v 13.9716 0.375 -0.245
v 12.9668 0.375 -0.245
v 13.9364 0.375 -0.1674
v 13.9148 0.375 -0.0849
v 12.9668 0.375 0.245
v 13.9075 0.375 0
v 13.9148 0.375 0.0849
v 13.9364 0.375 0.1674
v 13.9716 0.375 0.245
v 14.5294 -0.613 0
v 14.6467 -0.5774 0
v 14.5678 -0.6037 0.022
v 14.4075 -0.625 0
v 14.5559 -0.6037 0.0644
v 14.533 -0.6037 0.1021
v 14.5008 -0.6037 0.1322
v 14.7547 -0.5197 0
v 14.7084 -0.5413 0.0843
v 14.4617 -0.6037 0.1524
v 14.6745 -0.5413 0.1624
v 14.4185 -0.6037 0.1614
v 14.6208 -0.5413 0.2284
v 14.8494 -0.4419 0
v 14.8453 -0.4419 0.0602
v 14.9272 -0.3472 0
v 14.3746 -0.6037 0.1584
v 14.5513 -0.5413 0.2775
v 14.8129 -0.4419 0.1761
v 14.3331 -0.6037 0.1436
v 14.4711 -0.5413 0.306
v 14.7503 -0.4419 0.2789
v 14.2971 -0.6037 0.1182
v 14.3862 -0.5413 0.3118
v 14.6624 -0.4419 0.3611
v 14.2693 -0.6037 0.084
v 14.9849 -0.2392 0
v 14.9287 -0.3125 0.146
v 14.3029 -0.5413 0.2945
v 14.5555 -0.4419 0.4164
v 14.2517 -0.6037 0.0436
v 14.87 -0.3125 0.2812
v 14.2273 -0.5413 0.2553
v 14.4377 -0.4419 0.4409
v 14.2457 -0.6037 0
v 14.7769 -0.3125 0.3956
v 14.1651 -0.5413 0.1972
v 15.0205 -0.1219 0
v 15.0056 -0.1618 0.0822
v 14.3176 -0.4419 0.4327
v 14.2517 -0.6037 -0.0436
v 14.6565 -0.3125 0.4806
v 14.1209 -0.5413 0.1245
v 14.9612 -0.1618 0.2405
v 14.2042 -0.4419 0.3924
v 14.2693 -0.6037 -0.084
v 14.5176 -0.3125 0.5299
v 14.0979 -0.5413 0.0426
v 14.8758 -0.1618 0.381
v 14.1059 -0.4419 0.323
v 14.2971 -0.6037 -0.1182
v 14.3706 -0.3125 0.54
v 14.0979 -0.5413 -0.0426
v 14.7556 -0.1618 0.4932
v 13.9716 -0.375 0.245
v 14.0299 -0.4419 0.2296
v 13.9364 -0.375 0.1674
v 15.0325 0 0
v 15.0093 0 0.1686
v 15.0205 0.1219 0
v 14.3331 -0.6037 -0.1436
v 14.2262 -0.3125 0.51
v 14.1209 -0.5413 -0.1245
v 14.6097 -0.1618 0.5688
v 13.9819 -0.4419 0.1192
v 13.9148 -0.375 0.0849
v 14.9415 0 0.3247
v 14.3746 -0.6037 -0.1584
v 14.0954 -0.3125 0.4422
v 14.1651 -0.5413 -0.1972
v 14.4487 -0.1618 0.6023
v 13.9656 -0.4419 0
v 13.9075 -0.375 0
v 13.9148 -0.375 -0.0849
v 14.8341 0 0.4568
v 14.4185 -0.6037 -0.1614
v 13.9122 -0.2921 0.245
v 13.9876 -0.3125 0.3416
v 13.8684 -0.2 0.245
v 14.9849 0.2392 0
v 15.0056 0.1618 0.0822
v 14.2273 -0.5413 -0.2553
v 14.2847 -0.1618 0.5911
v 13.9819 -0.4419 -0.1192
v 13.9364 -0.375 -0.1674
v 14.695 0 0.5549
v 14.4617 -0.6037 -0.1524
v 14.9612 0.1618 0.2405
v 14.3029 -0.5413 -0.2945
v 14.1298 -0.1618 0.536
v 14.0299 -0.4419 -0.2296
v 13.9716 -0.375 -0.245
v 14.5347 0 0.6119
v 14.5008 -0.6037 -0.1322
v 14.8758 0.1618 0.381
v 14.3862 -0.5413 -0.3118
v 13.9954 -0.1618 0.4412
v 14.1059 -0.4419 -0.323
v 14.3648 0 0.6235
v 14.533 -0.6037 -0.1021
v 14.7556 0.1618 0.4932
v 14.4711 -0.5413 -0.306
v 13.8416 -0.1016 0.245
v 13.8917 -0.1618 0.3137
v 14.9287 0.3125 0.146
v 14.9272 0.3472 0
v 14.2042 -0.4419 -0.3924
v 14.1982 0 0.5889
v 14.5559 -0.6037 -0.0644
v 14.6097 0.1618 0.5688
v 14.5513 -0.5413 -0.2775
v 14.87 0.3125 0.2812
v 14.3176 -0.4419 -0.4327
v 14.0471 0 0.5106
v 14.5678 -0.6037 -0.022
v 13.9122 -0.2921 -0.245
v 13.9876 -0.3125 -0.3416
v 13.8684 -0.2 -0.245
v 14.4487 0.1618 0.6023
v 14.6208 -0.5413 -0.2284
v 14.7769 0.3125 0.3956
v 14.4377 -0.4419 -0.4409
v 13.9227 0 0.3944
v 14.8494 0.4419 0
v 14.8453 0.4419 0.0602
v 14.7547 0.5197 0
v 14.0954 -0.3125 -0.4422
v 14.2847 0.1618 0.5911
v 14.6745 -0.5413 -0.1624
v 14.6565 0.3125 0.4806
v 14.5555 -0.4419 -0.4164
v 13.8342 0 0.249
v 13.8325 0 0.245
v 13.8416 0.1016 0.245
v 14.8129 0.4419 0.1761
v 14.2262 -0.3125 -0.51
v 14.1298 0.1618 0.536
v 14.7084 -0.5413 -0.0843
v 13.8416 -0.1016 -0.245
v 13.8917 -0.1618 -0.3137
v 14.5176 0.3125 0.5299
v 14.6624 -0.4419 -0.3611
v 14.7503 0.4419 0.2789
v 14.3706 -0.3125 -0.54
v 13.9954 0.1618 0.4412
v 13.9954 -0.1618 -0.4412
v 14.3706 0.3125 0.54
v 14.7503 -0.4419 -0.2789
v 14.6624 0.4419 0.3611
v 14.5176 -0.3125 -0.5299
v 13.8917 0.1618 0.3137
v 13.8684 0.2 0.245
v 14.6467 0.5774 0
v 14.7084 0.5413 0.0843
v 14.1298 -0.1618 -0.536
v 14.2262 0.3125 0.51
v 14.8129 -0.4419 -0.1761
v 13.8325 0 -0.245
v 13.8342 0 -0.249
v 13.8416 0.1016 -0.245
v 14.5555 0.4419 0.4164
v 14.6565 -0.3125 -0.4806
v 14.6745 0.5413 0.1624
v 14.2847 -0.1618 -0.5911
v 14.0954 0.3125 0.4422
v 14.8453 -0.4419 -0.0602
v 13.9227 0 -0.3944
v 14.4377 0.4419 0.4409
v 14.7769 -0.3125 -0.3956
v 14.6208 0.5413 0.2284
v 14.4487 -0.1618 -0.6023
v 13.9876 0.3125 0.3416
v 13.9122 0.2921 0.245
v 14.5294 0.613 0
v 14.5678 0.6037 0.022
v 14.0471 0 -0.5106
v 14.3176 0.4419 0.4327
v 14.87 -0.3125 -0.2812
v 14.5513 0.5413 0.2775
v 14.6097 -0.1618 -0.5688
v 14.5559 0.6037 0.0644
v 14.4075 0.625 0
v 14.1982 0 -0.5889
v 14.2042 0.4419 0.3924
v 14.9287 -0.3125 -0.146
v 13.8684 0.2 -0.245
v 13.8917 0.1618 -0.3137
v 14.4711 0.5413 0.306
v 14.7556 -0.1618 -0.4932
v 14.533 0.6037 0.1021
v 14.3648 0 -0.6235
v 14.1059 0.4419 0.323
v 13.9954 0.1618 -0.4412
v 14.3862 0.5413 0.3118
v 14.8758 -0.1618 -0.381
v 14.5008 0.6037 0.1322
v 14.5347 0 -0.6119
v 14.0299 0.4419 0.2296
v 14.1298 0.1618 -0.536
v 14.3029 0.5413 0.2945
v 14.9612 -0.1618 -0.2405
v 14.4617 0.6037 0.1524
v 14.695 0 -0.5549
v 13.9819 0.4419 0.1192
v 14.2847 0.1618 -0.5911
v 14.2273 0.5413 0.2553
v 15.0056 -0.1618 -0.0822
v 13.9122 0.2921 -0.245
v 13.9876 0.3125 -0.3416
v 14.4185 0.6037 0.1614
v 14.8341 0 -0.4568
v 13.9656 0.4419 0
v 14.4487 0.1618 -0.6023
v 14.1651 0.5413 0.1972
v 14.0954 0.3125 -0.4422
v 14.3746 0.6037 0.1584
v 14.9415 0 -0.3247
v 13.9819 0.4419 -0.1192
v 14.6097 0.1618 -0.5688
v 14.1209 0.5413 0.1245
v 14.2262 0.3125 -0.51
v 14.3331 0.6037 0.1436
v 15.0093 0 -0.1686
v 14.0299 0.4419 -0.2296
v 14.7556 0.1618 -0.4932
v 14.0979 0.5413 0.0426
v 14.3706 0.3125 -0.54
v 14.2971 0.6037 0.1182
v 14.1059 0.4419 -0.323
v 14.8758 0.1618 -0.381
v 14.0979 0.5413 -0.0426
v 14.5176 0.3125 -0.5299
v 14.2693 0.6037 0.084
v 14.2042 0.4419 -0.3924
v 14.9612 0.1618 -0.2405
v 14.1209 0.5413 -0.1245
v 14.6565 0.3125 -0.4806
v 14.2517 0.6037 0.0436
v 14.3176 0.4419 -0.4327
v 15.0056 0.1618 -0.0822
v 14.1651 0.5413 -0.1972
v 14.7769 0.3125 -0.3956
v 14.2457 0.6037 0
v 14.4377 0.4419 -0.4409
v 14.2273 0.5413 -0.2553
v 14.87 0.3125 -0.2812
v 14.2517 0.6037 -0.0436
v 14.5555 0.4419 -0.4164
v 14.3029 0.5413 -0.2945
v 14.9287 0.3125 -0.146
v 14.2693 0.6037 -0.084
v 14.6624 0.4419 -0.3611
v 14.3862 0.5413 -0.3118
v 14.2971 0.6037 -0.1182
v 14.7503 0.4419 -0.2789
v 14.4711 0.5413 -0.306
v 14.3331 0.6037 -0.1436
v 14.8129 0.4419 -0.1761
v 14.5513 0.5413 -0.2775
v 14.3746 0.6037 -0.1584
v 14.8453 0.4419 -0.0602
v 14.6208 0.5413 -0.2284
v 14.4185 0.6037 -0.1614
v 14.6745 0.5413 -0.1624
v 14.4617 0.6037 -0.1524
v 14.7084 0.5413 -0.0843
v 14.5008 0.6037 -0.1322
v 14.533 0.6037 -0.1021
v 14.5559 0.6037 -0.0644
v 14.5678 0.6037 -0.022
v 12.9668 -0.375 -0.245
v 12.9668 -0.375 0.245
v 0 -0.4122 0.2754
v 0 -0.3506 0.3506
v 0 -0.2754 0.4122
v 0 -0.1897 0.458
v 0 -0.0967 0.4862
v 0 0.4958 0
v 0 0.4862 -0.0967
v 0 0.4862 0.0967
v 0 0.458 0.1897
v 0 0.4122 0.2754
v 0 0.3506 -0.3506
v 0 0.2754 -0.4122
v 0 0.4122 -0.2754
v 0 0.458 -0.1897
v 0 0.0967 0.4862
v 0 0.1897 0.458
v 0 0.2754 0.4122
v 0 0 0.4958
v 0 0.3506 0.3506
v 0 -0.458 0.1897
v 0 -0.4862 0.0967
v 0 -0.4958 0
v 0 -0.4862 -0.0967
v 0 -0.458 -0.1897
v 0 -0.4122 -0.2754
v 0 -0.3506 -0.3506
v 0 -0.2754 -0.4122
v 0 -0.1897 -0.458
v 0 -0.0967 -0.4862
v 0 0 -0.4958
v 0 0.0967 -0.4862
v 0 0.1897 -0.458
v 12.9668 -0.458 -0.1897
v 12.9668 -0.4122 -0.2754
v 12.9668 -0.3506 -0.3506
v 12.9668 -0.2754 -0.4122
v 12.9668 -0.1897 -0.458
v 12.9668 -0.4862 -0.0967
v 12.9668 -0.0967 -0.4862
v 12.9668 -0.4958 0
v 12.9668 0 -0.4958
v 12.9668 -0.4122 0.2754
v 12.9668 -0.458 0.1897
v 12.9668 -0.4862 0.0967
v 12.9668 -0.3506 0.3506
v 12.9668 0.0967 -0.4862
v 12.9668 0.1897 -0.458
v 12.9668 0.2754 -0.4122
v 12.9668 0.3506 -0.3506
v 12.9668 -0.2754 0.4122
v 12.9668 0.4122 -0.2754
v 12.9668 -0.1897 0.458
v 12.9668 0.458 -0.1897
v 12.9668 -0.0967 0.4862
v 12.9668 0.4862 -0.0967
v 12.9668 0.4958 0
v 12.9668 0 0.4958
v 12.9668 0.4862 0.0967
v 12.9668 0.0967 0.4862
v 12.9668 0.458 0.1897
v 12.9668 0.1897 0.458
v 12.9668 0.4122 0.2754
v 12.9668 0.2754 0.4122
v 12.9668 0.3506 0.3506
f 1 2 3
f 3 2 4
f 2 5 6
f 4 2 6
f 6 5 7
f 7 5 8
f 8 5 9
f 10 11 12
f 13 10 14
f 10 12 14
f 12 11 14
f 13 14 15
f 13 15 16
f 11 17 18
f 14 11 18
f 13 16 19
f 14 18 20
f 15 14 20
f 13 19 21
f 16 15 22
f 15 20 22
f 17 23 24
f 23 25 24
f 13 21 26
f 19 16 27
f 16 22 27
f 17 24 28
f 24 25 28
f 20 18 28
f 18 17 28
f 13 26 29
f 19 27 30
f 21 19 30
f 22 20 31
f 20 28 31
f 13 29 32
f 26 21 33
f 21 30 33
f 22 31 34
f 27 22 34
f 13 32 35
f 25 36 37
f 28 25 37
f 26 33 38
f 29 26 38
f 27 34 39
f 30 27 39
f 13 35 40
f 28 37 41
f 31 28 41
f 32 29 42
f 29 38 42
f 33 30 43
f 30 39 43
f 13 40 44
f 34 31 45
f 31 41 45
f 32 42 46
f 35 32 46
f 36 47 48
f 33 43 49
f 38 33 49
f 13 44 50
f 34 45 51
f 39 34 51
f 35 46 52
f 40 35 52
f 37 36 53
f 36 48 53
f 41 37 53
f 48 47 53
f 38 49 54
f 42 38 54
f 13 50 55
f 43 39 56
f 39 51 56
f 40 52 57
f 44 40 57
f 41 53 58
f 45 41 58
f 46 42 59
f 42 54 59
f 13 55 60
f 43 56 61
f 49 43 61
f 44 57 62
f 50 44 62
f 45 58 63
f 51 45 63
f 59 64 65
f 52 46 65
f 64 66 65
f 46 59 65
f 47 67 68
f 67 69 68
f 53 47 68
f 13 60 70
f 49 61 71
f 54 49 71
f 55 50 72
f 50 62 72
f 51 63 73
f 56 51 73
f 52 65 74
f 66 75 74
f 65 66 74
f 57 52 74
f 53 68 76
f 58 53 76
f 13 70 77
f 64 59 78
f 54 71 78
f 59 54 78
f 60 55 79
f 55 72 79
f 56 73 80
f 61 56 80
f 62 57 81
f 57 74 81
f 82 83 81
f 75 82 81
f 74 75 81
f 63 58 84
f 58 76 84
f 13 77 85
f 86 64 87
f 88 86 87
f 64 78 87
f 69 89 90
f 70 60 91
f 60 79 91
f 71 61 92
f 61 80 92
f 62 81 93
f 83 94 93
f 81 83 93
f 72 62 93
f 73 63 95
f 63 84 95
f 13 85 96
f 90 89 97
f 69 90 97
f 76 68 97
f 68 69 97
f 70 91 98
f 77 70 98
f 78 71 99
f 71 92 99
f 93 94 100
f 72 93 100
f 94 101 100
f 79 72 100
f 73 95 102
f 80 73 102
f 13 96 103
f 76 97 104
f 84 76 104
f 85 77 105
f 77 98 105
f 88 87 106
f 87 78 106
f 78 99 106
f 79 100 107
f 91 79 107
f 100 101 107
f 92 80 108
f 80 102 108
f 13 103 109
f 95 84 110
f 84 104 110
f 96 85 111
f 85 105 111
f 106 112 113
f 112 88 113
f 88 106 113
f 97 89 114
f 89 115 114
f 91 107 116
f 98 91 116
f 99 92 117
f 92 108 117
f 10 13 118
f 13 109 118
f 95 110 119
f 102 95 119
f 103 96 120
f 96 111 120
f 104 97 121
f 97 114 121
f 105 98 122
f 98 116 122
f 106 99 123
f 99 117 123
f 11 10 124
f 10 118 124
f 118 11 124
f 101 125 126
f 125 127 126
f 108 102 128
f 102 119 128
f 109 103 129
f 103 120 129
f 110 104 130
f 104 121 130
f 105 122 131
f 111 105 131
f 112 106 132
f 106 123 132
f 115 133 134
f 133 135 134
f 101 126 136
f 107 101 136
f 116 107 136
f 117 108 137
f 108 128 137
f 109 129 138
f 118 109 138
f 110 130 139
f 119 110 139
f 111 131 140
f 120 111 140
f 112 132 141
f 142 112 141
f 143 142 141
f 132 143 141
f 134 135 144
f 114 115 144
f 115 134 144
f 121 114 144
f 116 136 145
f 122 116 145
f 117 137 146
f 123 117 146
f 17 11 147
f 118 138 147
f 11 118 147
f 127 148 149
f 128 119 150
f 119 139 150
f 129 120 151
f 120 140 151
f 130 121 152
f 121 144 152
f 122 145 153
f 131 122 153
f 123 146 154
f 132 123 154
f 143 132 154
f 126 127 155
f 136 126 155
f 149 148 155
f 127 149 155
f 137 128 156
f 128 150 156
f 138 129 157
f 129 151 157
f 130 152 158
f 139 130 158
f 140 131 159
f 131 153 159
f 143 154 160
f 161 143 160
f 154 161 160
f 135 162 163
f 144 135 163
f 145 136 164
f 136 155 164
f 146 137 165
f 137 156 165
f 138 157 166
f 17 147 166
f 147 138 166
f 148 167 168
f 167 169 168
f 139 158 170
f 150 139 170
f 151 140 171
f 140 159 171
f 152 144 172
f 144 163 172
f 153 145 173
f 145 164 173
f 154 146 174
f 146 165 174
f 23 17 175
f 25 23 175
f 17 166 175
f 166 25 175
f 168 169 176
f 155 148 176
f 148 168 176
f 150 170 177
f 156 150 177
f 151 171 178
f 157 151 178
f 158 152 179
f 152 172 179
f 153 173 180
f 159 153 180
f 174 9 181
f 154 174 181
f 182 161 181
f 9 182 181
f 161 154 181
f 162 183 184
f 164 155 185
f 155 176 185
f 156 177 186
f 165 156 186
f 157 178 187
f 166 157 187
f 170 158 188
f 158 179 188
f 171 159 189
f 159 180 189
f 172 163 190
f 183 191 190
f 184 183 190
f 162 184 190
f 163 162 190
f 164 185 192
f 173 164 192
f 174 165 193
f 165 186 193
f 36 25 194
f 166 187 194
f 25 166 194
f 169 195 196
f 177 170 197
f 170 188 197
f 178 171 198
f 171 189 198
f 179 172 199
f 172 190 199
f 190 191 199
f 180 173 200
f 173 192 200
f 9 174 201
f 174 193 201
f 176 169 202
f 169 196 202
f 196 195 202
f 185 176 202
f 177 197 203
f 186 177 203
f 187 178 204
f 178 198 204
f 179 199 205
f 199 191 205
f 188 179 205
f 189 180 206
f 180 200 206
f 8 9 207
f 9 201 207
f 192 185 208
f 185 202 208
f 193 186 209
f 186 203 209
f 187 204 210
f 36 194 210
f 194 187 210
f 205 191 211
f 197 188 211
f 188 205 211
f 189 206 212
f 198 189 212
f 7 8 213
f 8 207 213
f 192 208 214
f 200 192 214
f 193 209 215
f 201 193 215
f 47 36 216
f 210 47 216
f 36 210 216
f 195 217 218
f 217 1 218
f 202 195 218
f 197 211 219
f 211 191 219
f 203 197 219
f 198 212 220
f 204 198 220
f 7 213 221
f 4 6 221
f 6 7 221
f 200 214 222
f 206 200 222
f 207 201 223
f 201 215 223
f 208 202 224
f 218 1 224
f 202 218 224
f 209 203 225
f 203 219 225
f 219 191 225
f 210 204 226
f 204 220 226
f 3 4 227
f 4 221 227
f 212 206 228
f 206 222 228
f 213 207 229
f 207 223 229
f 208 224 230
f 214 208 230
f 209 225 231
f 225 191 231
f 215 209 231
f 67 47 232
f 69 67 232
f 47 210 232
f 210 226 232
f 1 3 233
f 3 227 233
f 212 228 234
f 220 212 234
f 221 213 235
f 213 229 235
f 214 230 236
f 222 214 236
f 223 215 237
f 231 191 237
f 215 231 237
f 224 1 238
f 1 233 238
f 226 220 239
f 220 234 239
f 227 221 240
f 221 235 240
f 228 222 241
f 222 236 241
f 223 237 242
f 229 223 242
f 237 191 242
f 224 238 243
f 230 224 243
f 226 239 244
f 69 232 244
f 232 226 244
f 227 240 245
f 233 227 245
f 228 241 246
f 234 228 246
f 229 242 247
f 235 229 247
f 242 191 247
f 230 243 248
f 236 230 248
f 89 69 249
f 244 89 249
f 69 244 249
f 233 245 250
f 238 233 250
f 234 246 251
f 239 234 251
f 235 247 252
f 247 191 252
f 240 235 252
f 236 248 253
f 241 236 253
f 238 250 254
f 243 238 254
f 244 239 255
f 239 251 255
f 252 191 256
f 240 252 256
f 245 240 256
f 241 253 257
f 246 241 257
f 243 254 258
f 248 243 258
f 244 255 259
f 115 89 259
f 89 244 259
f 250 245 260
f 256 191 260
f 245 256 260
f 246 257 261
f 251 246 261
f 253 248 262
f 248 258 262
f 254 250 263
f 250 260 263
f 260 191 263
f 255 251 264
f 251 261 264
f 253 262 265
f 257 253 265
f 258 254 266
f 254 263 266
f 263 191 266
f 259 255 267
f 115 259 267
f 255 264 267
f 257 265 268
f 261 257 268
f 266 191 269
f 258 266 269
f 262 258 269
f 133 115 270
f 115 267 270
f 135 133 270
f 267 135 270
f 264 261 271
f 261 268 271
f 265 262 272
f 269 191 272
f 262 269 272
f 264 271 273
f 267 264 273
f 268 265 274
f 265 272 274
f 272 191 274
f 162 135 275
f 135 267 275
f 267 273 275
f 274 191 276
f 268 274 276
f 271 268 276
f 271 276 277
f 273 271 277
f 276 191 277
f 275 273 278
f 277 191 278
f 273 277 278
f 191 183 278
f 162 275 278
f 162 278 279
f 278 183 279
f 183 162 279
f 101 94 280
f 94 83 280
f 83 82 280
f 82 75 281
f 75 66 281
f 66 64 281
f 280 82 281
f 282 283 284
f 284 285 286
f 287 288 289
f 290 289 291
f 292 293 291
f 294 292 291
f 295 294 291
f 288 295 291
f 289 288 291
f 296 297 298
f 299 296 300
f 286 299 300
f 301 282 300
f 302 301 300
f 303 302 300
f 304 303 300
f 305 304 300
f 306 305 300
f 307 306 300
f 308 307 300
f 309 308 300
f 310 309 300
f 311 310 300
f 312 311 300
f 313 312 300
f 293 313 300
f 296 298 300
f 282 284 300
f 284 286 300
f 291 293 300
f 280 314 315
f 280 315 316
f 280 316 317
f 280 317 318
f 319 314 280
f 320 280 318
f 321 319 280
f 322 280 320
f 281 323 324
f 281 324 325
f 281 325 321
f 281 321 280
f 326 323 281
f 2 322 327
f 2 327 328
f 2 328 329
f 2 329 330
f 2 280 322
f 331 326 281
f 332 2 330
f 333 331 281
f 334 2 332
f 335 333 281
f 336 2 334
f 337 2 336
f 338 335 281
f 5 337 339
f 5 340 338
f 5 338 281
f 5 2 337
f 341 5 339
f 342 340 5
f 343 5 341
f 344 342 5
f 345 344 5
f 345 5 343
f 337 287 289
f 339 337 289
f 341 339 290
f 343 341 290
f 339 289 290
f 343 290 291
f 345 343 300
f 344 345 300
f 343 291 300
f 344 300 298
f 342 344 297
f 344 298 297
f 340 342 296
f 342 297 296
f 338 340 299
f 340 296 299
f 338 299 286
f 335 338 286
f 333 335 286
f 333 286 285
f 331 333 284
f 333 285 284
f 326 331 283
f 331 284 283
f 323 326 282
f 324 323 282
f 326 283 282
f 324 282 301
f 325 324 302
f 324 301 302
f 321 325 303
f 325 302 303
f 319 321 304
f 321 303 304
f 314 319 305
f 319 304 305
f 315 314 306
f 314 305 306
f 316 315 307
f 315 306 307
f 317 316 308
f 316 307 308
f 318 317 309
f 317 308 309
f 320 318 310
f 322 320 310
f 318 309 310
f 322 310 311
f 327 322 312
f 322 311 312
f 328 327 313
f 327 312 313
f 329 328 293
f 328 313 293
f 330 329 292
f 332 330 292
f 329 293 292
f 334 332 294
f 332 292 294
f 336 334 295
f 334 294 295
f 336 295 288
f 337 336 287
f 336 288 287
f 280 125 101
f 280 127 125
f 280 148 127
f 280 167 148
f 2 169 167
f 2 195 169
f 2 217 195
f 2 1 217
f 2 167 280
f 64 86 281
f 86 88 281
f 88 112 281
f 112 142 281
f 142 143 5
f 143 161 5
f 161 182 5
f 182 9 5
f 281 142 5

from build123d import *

# Parameters (mm, degrees)
PAD_DEPTH    = 0.245
SKETCH003_R  = 0.495763
PAD001_DEPTH = 12.96675


with BuildPart() as part:
    # Sketch → Pad (new body, symmetric)
    with BuildSketch(Plane.XY):
        with BuildLine():
            Line((0, 0.375), (14.4075, 0.375))
            ThreePointArc((14.4075, -0.375), (14.7825, 0), (14.4075, 0.375))
            Line((14.4075, -0.375), (0, -0.375))
            Line((0, 0), (0, -0.375))
            Line((0, 0.375), (0, 0))
        make_face()
    extrude(amount=PAD_DEPTH, both=True)

    # Sketch002 → Revolution001 (revolve)
    with BuildSketch(Plane.XY):
        with BuildLine():
            ThreePointArc((14.4075, -0.625), (15.0325, 0), (14.4075, 0.625))
            Line((14.4075, 0.625), (14.4075, 0))
            Line((14.4075, 0), (14.4075, -0.625))
        make_face()
    revolve(axis=Axis((14.4075, 0, 0), (0, -1, 0)))

    # Sketch003 → Pad001 (join)
    with BuildSketch(Plane.YZ):
        Circle(SKETCH003_R)
    extrude(amount=PAD001_DEPTH)


solid = part.part
